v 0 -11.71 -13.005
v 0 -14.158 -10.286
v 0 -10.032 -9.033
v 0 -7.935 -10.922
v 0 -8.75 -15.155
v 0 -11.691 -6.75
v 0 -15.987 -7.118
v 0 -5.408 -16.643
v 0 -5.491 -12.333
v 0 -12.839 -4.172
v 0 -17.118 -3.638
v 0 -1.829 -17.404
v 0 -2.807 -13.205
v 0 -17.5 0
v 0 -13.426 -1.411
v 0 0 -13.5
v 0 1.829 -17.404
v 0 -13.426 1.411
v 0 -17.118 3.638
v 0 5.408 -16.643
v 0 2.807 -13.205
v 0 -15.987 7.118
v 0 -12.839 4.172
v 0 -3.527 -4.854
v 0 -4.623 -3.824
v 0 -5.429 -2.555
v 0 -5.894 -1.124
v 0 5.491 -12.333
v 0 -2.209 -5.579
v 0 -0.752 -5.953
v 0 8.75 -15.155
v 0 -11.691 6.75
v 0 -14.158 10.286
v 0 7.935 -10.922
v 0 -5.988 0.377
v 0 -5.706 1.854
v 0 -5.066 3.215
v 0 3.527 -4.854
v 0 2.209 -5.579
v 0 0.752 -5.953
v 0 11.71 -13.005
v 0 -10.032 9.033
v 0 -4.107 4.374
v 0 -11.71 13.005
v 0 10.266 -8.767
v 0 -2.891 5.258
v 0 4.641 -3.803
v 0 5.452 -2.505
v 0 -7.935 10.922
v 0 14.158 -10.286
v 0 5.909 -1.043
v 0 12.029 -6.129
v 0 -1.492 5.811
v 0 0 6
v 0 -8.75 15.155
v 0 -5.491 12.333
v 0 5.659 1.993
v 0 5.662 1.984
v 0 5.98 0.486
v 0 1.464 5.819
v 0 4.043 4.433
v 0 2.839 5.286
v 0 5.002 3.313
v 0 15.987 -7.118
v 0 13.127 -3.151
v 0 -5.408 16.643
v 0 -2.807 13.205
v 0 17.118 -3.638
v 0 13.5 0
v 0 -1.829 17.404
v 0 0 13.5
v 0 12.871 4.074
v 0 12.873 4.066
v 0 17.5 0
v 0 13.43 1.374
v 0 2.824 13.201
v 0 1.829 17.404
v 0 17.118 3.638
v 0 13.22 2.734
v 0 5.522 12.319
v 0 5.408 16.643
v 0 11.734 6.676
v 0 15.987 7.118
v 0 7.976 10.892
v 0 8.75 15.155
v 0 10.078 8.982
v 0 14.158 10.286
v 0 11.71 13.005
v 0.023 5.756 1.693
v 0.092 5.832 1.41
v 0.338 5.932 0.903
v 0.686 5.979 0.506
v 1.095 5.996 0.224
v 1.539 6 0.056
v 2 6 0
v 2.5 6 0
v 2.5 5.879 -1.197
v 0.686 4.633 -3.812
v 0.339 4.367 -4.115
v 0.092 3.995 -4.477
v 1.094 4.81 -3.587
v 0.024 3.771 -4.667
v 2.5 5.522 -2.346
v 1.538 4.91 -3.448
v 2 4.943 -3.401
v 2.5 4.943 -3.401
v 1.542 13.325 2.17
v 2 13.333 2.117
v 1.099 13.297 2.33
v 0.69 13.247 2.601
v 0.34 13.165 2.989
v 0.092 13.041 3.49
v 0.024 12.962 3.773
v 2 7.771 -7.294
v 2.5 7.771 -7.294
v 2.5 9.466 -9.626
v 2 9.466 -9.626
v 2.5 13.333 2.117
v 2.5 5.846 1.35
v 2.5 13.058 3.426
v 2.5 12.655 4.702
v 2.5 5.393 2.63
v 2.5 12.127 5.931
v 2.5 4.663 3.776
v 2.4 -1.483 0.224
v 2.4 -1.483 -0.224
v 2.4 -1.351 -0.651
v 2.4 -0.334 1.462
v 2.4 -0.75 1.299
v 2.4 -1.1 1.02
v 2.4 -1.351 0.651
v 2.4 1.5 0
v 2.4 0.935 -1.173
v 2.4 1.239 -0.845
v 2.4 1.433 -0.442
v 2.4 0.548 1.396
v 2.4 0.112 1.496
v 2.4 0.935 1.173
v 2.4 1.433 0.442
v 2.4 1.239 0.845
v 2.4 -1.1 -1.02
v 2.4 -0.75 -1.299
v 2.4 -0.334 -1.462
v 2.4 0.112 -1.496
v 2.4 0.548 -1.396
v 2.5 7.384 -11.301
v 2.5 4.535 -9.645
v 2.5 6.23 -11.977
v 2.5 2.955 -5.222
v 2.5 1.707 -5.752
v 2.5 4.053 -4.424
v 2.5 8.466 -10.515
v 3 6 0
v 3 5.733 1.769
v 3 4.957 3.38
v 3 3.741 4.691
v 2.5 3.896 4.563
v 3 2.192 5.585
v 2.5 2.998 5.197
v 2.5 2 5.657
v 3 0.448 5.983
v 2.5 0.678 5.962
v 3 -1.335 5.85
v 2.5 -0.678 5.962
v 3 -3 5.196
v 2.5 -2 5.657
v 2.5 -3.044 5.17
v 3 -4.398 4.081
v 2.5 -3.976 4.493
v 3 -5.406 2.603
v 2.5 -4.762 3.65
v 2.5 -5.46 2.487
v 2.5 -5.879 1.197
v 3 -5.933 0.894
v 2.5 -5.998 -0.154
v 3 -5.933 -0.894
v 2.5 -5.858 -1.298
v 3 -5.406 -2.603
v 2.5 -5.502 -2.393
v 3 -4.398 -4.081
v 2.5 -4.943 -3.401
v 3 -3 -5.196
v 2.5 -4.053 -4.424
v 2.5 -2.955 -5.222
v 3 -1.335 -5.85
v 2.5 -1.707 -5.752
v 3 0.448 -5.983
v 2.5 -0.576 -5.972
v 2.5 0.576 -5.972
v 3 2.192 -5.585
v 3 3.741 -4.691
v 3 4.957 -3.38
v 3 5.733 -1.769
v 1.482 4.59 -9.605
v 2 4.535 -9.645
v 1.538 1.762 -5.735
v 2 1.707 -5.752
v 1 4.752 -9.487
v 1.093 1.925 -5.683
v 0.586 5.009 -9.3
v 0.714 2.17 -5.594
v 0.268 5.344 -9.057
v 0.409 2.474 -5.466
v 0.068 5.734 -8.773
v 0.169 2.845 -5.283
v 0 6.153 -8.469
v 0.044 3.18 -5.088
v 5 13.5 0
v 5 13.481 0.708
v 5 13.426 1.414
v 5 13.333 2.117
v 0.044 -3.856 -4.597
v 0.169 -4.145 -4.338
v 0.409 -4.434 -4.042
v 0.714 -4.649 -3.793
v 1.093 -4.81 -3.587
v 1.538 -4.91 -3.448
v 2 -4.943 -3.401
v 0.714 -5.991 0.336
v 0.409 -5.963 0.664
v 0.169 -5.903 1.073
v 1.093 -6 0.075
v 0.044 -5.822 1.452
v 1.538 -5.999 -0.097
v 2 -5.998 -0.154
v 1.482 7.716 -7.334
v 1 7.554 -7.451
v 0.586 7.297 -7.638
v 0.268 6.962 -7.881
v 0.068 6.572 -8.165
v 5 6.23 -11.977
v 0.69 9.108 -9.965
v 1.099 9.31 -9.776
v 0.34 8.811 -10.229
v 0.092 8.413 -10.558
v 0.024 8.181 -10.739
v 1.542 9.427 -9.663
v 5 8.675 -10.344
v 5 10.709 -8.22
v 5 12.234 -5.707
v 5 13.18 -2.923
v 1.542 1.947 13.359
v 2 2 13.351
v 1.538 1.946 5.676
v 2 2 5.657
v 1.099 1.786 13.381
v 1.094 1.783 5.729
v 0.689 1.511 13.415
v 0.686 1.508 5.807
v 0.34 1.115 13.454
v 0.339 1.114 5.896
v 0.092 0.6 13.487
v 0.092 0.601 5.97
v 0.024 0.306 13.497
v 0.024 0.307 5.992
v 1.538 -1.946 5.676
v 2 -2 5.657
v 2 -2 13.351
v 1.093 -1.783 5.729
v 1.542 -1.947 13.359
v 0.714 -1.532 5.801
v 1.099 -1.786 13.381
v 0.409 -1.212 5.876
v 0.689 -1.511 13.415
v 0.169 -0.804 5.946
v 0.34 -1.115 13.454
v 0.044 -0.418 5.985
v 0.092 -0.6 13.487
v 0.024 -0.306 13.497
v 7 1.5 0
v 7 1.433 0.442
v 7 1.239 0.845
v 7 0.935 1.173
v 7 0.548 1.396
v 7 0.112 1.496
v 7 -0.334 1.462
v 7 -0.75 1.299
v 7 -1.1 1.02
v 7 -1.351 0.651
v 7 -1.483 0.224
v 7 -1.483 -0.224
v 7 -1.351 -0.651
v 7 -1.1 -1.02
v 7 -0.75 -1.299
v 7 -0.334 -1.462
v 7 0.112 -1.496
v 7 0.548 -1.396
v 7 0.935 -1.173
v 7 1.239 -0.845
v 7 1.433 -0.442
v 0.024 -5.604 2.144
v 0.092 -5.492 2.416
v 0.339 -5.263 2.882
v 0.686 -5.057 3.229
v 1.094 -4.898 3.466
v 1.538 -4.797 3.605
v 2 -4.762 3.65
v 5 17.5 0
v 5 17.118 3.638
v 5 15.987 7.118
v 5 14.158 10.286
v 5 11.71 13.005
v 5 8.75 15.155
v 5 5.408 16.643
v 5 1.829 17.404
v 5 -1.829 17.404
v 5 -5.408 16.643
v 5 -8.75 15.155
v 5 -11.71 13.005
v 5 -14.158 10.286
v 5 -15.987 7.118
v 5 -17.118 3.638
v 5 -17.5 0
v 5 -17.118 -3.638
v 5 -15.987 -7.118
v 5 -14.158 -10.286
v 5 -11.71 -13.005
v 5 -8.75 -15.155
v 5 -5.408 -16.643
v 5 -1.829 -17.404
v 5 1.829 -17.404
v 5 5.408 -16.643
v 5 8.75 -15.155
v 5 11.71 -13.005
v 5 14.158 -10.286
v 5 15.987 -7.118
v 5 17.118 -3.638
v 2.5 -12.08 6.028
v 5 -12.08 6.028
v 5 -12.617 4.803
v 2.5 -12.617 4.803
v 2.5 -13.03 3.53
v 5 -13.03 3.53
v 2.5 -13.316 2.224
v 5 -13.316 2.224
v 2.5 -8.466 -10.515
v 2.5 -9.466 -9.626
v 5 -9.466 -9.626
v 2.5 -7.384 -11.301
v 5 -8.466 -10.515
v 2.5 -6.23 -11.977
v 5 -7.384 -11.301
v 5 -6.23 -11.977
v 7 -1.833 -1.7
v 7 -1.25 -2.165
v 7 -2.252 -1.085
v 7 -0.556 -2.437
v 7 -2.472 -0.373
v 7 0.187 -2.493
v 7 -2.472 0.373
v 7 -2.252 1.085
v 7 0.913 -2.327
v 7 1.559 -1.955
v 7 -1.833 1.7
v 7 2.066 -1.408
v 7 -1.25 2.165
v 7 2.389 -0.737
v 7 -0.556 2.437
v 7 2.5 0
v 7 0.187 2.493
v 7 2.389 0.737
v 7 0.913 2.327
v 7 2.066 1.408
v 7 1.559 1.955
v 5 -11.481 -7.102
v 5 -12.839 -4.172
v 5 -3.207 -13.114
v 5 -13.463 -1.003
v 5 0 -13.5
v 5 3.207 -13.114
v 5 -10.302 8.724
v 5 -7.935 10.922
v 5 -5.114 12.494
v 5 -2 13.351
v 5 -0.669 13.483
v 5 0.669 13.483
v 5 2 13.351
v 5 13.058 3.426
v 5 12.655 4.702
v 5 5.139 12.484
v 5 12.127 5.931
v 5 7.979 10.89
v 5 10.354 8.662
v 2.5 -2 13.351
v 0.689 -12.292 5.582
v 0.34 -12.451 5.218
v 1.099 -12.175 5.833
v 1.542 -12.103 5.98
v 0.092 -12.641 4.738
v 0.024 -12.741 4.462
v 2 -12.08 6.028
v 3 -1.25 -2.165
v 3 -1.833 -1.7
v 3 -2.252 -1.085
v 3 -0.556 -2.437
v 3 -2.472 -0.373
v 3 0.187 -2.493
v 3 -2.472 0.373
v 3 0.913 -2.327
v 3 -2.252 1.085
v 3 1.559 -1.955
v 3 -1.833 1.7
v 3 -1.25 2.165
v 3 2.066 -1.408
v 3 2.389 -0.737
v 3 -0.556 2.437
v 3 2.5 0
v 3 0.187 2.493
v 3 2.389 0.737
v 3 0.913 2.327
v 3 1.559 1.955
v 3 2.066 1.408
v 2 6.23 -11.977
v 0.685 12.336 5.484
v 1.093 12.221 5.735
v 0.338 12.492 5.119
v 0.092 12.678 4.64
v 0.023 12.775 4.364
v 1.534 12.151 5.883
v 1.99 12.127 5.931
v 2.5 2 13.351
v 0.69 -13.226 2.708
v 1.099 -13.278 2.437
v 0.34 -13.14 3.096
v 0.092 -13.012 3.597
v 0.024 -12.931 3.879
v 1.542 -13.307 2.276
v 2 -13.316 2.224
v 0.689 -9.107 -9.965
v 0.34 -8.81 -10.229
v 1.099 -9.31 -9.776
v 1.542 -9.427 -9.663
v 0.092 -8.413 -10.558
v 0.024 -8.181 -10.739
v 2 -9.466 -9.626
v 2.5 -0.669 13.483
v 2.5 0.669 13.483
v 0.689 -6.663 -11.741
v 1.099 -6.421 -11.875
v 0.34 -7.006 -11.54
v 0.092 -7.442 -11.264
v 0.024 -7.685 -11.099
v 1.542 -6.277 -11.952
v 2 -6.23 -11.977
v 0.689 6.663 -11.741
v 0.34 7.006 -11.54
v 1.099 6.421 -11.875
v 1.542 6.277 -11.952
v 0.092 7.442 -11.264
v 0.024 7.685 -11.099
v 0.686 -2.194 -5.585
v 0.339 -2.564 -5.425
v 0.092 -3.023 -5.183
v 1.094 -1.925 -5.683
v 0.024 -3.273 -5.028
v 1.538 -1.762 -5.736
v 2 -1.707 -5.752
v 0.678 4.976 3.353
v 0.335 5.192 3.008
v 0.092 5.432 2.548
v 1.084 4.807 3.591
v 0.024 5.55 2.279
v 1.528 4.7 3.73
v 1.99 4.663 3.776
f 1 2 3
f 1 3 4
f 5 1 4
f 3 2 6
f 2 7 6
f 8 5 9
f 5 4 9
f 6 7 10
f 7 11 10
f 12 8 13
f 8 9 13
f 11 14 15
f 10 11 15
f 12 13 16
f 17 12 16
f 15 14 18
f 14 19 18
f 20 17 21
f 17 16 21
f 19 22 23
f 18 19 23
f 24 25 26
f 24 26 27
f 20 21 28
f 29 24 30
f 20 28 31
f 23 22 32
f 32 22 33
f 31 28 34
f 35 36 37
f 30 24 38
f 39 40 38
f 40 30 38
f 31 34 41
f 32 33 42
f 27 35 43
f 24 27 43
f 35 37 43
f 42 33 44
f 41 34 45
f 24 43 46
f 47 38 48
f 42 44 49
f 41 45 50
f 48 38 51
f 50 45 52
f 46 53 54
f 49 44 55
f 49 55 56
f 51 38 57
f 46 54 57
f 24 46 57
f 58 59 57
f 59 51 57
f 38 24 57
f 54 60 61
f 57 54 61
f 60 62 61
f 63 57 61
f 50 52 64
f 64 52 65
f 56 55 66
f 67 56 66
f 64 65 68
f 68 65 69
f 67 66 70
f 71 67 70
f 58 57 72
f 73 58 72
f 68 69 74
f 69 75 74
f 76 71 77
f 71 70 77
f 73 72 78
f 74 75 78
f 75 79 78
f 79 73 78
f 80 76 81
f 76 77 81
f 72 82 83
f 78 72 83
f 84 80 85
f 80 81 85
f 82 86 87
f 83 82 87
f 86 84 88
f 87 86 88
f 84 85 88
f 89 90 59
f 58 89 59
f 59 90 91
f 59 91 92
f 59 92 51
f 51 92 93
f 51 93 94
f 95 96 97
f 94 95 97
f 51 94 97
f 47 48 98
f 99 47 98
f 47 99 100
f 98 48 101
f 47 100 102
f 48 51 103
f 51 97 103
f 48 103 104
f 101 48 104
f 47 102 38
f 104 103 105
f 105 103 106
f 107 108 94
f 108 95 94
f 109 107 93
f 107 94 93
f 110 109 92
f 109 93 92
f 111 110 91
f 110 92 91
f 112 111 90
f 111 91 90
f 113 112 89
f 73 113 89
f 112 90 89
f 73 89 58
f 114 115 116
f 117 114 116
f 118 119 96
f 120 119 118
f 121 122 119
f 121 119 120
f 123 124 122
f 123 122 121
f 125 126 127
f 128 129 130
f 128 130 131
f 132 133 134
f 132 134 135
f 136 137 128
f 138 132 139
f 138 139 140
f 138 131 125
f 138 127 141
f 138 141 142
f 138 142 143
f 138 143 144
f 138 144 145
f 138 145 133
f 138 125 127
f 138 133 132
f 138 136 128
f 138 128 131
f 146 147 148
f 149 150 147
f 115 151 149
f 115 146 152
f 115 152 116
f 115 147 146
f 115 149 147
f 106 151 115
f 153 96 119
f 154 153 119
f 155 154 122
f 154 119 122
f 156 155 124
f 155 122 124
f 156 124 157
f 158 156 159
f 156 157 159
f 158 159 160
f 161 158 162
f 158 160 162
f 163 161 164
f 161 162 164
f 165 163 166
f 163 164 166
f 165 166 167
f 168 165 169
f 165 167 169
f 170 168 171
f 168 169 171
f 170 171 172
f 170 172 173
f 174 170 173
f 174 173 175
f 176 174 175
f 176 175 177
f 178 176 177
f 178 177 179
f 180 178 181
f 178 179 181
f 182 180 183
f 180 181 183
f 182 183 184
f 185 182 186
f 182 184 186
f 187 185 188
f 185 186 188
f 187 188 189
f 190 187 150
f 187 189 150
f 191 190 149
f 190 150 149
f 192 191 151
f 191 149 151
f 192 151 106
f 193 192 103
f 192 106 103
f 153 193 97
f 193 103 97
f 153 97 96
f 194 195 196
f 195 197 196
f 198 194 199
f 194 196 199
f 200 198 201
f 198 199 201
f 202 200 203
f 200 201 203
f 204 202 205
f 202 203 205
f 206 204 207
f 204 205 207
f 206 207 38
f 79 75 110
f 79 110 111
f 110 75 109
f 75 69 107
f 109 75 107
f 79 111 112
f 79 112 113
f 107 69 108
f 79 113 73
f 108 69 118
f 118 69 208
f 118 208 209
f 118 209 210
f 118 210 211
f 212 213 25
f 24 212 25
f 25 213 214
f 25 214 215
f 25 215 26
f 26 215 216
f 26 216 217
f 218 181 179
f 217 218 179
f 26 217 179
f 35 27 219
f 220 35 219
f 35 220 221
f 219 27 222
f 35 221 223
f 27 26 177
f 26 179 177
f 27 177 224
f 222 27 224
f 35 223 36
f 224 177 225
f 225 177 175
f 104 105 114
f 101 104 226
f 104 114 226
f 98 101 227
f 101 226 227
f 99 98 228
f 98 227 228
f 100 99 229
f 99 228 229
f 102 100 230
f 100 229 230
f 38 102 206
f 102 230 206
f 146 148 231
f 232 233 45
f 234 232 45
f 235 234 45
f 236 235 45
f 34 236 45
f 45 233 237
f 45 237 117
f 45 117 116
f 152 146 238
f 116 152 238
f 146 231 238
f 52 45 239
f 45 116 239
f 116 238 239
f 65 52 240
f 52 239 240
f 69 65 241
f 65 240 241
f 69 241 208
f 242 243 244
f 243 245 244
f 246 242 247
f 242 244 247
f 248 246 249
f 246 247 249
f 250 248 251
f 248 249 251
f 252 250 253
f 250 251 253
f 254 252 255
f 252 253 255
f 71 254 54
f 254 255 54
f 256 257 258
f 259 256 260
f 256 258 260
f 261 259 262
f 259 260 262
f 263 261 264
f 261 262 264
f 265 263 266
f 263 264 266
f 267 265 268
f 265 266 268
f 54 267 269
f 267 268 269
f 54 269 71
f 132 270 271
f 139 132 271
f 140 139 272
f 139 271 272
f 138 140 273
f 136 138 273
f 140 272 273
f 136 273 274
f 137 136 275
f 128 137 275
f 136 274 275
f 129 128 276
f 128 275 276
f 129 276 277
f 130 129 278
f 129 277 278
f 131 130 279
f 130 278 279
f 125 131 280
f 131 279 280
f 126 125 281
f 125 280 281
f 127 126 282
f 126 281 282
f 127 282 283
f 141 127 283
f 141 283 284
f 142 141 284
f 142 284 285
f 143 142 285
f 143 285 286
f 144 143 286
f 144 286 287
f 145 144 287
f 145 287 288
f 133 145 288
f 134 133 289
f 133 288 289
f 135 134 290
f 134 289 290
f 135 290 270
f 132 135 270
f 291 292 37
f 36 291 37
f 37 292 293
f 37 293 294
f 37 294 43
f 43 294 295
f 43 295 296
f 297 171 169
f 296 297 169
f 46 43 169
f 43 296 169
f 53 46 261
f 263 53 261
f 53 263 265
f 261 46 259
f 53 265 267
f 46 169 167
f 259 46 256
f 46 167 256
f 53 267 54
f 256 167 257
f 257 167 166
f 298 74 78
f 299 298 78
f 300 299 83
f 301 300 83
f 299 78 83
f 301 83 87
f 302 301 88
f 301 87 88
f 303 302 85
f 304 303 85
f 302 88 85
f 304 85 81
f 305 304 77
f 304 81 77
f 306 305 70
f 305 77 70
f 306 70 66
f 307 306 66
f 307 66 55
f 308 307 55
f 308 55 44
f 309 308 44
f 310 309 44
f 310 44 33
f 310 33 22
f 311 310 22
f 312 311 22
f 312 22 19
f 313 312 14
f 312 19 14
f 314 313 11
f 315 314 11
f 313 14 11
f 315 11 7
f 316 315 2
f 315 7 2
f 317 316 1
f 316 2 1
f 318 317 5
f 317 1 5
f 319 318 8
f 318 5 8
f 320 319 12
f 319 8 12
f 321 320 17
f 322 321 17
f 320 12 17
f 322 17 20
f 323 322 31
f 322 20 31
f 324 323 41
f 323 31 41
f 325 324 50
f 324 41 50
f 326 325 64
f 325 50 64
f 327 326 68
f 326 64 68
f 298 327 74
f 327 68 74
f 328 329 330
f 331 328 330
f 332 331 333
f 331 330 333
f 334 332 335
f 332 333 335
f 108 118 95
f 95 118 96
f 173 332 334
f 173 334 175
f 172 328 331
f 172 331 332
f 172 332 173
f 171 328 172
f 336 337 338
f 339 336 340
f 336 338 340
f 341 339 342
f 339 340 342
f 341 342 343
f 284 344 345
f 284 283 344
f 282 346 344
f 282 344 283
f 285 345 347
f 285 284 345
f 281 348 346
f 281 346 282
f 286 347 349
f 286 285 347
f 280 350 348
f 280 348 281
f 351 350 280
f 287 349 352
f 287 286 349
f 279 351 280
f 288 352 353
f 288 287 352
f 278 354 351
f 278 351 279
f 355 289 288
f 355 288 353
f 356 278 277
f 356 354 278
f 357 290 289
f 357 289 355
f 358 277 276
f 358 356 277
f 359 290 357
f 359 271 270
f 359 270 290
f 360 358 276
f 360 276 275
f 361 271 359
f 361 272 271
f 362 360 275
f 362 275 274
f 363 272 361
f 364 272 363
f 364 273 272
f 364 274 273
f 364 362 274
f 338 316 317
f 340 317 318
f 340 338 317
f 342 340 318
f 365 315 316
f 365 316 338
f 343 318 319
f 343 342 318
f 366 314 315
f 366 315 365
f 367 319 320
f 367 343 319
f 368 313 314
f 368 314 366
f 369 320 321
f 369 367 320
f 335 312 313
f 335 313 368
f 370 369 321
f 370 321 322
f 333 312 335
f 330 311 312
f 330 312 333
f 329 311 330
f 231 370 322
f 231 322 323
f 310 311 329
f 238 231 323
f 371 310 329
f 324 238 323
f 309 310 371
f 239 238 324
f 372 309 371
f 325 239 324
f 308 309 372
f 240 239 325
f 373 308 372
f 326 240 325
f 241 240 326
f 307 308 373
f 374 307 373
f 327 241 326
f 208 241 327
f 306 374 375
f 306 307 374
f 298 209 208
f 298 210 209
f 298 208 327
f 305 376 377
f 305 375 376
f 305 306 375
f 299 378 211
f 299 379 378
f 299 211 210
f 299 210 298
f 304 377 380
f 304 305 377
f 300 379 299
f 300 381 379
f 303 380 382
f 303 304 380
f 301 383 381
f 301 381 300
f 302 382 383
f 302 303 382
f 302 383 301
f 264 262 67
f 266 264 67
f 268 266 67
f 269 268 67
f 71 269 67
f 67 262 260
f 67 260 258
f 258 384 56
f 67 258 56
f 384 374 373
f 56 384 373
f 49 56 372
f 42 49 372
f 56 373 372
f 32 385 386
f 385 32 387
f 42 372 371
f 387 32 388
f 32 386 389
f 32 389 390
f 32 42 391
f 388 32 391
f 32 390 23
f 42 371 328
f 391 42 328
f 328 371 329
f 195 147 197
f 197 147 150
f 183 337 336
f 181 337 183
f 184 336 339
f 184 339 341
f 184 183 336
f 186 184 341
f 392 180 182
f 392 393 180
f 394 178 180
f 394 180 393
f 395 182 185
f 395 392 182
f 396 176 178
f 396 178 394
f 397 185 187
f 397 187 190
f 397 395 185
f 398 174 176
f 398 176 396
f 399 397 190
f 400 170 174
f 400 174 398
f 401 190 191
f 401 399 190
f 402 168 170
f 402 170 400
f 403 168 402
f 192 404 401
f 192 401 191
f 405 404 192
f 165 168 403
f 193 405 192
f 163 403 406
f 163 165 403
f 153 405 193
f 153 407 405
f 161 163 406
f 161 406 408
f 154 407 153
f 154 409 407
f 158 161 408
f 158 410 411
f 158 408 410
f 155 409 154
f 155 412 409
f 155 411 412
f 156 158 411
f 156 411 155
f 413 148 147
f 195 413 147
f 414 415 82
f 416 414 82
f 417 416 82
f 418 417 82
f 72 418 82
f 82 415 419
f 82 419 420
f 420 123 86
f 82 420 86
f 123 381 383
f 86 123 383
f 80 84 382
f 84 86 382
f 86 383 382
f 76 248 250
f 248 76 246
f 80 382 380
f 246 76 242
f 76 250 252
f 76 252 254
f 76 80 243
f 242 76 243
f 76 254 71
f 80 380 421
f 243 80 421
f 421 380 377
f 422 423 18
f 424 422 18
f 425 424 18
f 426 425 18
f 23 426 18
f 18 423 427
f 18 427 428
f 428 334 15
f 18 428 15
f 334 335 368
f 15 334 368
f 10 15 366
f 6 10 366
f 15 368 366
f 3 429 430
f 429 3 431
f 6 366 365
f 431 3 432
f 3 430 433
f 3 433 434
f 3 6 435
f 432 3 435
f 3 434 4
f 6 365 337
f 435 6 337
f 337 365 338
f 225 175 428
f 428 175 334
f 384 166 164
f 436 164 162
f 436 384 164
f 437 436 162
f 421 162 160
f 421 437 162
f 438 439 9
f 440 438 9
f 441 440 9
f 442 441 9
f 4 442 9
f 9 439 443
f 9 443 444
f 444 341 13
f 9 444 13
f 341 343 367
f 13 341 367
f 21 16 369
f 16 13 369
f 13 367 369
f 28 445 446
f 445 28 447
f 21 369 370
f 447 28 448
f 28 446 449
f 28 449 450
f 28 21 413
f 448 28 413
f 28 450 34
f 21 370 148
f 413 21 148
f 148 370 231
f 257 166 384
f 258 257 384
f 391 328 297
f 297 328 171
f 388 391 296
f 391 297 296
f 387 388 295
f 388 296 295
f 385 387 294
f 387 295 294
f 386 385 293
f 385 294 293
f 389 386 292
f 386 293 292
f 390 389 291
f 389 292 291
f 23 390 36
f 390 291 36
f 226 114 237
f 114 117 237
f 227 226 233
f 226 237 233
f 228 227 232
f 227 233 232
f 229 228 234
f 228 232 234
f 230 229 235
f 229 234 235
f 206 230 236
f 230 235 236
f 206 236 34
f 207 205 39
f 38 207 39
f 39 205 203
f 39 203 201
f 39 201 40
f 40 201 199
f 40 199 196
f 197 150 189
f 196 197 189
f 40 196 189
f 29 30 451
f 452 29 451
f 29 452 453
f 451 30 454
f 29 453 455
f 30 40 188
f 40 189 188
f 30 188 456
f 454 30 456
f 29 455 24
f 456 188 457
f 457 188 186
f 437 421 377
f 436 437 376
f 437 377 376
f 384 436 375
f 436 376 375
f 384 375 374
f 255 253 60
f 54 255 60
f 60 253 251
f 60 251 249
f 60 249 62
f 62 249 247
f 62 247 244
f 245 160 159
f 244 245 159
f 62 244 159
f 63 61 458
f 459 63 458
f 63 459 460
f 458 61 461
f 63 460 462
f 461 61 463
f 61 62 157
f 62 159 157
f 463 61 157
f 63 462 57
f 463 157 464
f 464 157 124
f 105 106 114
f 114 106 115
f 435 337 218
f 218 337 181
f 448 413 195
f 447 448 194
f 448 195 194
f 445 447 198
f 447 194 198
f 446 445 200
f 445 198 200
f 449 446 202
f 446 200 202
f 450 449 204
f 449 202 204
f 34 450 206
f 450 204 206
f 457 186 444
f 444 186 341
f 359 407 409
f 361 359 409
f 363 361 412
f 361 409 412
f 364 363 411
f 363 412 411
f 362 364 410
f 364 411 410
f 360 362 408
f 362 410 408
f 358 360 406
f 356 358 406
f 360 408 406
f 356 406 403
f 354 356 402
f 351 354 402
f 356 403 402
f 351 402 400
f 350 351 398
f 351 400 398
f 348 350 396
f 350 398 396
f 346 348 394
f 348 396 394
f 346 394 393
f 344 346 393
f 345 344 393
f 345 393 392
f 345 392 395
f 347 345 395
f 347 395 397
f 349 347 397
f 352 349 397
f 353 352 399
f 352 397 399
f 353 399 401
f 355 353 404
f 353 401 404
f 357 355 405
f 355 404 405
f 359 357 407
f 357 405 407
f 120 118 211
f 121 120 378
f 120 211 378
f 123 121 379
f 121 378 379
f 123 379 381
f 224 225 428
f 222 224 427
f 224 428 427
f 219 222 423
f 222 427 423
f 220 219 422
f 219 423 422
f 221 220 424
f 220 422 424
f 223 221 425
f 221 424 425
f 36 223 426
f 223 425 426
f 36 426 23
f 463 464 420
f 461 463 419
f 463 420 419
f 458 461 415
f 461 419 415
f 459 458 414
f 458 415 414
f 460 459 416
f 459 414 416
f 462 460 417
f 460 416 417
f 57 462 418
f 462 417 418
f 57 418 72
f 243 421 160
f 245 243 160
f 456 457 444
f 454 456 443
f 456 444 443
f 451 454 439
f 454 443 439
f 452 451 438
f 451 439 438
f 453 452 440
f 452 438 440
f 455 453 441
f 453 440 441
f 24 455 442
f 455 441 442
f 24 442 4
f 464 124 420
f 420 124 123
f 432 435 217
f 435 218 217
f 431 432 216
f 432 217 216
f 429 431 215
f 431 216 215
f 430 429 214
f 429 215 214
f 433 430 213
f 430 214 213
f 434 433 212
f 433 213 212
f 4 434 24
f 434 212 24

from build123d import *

# Parameters (mm, degrees)
F0_R      = 17.5
F1_DEPTH  = 5
F3_DEPTH  = 25
F4_R      = 13.5
F5_DEPTH  = 2.5
F6_R      = 1.9999
F7_R      = 1.99
F8_R      = 6
F9_DEPTH  = 0.5
F10_R     = 2.5
F11_DEPTH = 4
F12_R     = 1.5
F13_DEPTH = 4.6


# Not quite as in the source:
# - a fillet or chamfer is up to 0.001 mm smaller than in the source, because OpenCascade refuses the exact size


with BuildPart() as f1:
    # F0 (on Right) → F1 (new body)
    with BuildSketch(Plane.YZ):
        Circle(F0_R)
    extrude(amount=F1_DEPTH)

    # F2 (on face) → F3 (cut)
    with BuildSketch(Plane.YZ.offset(5)):
        with BuildLine():
            Line((-2, 5.6568542495), (-2, 13.3510299228))
            ThreePointArc((-2, 13.3510299228), (-7.9351009059, 10.9217294241), (-12.0795500186, 6.0278081711))
            Line((-12.0795500186, 6.0278081711), (-4.761954107, 3.6501771304))
            ThreePointArc((-4.761954107, 3.6501771304), (-3.5267115138, 4.8541019662), (-2, 5.6568542495))
        make_face()
        with BuildLine():
            Line((4.6626960874, 3.7761442234), (12.1273810063, 5.9309889503))
            ThreePointArc((12.1273810063, 5.9309889503), (7.9787201688, 10.8899047042), (2, 13.3510299228))
            Line((2, 13.3510299228), (2, 5.6568542495))
            ThreePointArc((2, 5.6568542495), (3.4615238464, 4.9008012264), (4.6626960874, 3.7761442234))
        make_face()
        with BuildLine():
            ThreePointArc((9.4655724803, -9.6256395954), (12.4506069829, -5.2184658433), (13.5, 0))
            ThreePointArc((13.5, 0), (13.4581864786, 1.0617046234), (13.3330049322, 2.1168324159))
            Line((13.3330049322, 2.1168324159), (6, 0))
            ThreePointArc((6, 0), (5.7296726323, -1.7806884981), (4.943049491, -3.400920718))
            Line((4.943049491, -3.400920718), (7.7712408853, -7.2935922208))
            Line((7.7712408853, -7.2935922208), (9.4655724803, -9.6256395954))
        make_face()
        with BuildLine():
            ThreePointArc((-6.2295045028, -11.9767806046), (0, -13.5), (6.2295045028, -11.9767806046))
            Line((6.2295045028, -11.9767806046), (4.5351729078, -9.64473323))
            Line((4.5351729078, -9.64473323), (1.7069815135, -5.7520617271))
            ThreePointArc((1.7069815135, -5.7520617271), (0, -6), (-1.7069815135, -5.7520617271))
            Line((-1.7069815135, -5.7520617271), (-6.2295045028, -11.9767806046))
        make_face()
        with BuildLine():
            Line((-9.4655724803, -9.6256395954), (-4.943049491, -3.400920718))
            ThreePointArc((-4.943049491, -3.400920718), (-5.7063390978, -1.8541019662), (-5.9980220845, -0.1540489348))
            Line((-5.9980220845, -0.1540489348), (-13.3156179961, 2.223582106))
            ThreePointArc((-13.3156179961, 2.223582106), (-12.83926297, -4.1717294241), (-9.4655724803, -9.6256395954))
        make_face()
    extrude(amount=-F3_DEPTH, mode=Mode.SUBTRACT)

    # F4 (on face) → F5 (cut)
    with BuildSketch(Plane.YZ.offset(5)):
        Circle(F4_R)
    extrude(amount=-F5_DEPTH, mode=Mode.SUBTRACT)

    # F6 (radius 2 in the source; OpenCascade refuses exactly that, so slightly less here)
    f6_edges = [f1.edges().sort_by_distance(p)[0] for p in [
        (0, -9.65682, 1.034767),
        (0, -8.420752, 4.838993),
        (0, -7.204311, -6.51328),
        (0, -3.968243, -8.864421),
        (0, 3.968243, -8.864421),
        (0, 7.204311, -6.51328),
        (0, 9.666502, 1.058416),
        (0, 2, 9.503942),
        (0, -2, 9.503942),
    ]]
    fillet(f6_edges, radius=F6_R)

    # F7
    f7_edges = [f1.edges().sort_by_distance(p)[0] for p in [
        (0, 8.395039, 4.853567),
    ]]
    fillet(f7_edges, radius=F7_R)

    # F8 (on face) → F9 (join)
    with BuildSketch(Plane.YZ.offset(2.5)):
        Circle(F8_R)
    extrude(amount=F9_DEPTH)

    # F10 (on face) → F11 (join)
    with BuildSketch(Plane.YZ.offset(3)):
        Circle(F10_R)
    extrude(amount=F11_DEPTH)

    # F12 (on face) → F13 (cut)
    with BuildSketch(Plane.YZ.offset(7)):
        Circle(F12_R)
    extrude(amount=-F13_DEPTH, mode=Mode.SUBTRACT)


solid = f1.part
